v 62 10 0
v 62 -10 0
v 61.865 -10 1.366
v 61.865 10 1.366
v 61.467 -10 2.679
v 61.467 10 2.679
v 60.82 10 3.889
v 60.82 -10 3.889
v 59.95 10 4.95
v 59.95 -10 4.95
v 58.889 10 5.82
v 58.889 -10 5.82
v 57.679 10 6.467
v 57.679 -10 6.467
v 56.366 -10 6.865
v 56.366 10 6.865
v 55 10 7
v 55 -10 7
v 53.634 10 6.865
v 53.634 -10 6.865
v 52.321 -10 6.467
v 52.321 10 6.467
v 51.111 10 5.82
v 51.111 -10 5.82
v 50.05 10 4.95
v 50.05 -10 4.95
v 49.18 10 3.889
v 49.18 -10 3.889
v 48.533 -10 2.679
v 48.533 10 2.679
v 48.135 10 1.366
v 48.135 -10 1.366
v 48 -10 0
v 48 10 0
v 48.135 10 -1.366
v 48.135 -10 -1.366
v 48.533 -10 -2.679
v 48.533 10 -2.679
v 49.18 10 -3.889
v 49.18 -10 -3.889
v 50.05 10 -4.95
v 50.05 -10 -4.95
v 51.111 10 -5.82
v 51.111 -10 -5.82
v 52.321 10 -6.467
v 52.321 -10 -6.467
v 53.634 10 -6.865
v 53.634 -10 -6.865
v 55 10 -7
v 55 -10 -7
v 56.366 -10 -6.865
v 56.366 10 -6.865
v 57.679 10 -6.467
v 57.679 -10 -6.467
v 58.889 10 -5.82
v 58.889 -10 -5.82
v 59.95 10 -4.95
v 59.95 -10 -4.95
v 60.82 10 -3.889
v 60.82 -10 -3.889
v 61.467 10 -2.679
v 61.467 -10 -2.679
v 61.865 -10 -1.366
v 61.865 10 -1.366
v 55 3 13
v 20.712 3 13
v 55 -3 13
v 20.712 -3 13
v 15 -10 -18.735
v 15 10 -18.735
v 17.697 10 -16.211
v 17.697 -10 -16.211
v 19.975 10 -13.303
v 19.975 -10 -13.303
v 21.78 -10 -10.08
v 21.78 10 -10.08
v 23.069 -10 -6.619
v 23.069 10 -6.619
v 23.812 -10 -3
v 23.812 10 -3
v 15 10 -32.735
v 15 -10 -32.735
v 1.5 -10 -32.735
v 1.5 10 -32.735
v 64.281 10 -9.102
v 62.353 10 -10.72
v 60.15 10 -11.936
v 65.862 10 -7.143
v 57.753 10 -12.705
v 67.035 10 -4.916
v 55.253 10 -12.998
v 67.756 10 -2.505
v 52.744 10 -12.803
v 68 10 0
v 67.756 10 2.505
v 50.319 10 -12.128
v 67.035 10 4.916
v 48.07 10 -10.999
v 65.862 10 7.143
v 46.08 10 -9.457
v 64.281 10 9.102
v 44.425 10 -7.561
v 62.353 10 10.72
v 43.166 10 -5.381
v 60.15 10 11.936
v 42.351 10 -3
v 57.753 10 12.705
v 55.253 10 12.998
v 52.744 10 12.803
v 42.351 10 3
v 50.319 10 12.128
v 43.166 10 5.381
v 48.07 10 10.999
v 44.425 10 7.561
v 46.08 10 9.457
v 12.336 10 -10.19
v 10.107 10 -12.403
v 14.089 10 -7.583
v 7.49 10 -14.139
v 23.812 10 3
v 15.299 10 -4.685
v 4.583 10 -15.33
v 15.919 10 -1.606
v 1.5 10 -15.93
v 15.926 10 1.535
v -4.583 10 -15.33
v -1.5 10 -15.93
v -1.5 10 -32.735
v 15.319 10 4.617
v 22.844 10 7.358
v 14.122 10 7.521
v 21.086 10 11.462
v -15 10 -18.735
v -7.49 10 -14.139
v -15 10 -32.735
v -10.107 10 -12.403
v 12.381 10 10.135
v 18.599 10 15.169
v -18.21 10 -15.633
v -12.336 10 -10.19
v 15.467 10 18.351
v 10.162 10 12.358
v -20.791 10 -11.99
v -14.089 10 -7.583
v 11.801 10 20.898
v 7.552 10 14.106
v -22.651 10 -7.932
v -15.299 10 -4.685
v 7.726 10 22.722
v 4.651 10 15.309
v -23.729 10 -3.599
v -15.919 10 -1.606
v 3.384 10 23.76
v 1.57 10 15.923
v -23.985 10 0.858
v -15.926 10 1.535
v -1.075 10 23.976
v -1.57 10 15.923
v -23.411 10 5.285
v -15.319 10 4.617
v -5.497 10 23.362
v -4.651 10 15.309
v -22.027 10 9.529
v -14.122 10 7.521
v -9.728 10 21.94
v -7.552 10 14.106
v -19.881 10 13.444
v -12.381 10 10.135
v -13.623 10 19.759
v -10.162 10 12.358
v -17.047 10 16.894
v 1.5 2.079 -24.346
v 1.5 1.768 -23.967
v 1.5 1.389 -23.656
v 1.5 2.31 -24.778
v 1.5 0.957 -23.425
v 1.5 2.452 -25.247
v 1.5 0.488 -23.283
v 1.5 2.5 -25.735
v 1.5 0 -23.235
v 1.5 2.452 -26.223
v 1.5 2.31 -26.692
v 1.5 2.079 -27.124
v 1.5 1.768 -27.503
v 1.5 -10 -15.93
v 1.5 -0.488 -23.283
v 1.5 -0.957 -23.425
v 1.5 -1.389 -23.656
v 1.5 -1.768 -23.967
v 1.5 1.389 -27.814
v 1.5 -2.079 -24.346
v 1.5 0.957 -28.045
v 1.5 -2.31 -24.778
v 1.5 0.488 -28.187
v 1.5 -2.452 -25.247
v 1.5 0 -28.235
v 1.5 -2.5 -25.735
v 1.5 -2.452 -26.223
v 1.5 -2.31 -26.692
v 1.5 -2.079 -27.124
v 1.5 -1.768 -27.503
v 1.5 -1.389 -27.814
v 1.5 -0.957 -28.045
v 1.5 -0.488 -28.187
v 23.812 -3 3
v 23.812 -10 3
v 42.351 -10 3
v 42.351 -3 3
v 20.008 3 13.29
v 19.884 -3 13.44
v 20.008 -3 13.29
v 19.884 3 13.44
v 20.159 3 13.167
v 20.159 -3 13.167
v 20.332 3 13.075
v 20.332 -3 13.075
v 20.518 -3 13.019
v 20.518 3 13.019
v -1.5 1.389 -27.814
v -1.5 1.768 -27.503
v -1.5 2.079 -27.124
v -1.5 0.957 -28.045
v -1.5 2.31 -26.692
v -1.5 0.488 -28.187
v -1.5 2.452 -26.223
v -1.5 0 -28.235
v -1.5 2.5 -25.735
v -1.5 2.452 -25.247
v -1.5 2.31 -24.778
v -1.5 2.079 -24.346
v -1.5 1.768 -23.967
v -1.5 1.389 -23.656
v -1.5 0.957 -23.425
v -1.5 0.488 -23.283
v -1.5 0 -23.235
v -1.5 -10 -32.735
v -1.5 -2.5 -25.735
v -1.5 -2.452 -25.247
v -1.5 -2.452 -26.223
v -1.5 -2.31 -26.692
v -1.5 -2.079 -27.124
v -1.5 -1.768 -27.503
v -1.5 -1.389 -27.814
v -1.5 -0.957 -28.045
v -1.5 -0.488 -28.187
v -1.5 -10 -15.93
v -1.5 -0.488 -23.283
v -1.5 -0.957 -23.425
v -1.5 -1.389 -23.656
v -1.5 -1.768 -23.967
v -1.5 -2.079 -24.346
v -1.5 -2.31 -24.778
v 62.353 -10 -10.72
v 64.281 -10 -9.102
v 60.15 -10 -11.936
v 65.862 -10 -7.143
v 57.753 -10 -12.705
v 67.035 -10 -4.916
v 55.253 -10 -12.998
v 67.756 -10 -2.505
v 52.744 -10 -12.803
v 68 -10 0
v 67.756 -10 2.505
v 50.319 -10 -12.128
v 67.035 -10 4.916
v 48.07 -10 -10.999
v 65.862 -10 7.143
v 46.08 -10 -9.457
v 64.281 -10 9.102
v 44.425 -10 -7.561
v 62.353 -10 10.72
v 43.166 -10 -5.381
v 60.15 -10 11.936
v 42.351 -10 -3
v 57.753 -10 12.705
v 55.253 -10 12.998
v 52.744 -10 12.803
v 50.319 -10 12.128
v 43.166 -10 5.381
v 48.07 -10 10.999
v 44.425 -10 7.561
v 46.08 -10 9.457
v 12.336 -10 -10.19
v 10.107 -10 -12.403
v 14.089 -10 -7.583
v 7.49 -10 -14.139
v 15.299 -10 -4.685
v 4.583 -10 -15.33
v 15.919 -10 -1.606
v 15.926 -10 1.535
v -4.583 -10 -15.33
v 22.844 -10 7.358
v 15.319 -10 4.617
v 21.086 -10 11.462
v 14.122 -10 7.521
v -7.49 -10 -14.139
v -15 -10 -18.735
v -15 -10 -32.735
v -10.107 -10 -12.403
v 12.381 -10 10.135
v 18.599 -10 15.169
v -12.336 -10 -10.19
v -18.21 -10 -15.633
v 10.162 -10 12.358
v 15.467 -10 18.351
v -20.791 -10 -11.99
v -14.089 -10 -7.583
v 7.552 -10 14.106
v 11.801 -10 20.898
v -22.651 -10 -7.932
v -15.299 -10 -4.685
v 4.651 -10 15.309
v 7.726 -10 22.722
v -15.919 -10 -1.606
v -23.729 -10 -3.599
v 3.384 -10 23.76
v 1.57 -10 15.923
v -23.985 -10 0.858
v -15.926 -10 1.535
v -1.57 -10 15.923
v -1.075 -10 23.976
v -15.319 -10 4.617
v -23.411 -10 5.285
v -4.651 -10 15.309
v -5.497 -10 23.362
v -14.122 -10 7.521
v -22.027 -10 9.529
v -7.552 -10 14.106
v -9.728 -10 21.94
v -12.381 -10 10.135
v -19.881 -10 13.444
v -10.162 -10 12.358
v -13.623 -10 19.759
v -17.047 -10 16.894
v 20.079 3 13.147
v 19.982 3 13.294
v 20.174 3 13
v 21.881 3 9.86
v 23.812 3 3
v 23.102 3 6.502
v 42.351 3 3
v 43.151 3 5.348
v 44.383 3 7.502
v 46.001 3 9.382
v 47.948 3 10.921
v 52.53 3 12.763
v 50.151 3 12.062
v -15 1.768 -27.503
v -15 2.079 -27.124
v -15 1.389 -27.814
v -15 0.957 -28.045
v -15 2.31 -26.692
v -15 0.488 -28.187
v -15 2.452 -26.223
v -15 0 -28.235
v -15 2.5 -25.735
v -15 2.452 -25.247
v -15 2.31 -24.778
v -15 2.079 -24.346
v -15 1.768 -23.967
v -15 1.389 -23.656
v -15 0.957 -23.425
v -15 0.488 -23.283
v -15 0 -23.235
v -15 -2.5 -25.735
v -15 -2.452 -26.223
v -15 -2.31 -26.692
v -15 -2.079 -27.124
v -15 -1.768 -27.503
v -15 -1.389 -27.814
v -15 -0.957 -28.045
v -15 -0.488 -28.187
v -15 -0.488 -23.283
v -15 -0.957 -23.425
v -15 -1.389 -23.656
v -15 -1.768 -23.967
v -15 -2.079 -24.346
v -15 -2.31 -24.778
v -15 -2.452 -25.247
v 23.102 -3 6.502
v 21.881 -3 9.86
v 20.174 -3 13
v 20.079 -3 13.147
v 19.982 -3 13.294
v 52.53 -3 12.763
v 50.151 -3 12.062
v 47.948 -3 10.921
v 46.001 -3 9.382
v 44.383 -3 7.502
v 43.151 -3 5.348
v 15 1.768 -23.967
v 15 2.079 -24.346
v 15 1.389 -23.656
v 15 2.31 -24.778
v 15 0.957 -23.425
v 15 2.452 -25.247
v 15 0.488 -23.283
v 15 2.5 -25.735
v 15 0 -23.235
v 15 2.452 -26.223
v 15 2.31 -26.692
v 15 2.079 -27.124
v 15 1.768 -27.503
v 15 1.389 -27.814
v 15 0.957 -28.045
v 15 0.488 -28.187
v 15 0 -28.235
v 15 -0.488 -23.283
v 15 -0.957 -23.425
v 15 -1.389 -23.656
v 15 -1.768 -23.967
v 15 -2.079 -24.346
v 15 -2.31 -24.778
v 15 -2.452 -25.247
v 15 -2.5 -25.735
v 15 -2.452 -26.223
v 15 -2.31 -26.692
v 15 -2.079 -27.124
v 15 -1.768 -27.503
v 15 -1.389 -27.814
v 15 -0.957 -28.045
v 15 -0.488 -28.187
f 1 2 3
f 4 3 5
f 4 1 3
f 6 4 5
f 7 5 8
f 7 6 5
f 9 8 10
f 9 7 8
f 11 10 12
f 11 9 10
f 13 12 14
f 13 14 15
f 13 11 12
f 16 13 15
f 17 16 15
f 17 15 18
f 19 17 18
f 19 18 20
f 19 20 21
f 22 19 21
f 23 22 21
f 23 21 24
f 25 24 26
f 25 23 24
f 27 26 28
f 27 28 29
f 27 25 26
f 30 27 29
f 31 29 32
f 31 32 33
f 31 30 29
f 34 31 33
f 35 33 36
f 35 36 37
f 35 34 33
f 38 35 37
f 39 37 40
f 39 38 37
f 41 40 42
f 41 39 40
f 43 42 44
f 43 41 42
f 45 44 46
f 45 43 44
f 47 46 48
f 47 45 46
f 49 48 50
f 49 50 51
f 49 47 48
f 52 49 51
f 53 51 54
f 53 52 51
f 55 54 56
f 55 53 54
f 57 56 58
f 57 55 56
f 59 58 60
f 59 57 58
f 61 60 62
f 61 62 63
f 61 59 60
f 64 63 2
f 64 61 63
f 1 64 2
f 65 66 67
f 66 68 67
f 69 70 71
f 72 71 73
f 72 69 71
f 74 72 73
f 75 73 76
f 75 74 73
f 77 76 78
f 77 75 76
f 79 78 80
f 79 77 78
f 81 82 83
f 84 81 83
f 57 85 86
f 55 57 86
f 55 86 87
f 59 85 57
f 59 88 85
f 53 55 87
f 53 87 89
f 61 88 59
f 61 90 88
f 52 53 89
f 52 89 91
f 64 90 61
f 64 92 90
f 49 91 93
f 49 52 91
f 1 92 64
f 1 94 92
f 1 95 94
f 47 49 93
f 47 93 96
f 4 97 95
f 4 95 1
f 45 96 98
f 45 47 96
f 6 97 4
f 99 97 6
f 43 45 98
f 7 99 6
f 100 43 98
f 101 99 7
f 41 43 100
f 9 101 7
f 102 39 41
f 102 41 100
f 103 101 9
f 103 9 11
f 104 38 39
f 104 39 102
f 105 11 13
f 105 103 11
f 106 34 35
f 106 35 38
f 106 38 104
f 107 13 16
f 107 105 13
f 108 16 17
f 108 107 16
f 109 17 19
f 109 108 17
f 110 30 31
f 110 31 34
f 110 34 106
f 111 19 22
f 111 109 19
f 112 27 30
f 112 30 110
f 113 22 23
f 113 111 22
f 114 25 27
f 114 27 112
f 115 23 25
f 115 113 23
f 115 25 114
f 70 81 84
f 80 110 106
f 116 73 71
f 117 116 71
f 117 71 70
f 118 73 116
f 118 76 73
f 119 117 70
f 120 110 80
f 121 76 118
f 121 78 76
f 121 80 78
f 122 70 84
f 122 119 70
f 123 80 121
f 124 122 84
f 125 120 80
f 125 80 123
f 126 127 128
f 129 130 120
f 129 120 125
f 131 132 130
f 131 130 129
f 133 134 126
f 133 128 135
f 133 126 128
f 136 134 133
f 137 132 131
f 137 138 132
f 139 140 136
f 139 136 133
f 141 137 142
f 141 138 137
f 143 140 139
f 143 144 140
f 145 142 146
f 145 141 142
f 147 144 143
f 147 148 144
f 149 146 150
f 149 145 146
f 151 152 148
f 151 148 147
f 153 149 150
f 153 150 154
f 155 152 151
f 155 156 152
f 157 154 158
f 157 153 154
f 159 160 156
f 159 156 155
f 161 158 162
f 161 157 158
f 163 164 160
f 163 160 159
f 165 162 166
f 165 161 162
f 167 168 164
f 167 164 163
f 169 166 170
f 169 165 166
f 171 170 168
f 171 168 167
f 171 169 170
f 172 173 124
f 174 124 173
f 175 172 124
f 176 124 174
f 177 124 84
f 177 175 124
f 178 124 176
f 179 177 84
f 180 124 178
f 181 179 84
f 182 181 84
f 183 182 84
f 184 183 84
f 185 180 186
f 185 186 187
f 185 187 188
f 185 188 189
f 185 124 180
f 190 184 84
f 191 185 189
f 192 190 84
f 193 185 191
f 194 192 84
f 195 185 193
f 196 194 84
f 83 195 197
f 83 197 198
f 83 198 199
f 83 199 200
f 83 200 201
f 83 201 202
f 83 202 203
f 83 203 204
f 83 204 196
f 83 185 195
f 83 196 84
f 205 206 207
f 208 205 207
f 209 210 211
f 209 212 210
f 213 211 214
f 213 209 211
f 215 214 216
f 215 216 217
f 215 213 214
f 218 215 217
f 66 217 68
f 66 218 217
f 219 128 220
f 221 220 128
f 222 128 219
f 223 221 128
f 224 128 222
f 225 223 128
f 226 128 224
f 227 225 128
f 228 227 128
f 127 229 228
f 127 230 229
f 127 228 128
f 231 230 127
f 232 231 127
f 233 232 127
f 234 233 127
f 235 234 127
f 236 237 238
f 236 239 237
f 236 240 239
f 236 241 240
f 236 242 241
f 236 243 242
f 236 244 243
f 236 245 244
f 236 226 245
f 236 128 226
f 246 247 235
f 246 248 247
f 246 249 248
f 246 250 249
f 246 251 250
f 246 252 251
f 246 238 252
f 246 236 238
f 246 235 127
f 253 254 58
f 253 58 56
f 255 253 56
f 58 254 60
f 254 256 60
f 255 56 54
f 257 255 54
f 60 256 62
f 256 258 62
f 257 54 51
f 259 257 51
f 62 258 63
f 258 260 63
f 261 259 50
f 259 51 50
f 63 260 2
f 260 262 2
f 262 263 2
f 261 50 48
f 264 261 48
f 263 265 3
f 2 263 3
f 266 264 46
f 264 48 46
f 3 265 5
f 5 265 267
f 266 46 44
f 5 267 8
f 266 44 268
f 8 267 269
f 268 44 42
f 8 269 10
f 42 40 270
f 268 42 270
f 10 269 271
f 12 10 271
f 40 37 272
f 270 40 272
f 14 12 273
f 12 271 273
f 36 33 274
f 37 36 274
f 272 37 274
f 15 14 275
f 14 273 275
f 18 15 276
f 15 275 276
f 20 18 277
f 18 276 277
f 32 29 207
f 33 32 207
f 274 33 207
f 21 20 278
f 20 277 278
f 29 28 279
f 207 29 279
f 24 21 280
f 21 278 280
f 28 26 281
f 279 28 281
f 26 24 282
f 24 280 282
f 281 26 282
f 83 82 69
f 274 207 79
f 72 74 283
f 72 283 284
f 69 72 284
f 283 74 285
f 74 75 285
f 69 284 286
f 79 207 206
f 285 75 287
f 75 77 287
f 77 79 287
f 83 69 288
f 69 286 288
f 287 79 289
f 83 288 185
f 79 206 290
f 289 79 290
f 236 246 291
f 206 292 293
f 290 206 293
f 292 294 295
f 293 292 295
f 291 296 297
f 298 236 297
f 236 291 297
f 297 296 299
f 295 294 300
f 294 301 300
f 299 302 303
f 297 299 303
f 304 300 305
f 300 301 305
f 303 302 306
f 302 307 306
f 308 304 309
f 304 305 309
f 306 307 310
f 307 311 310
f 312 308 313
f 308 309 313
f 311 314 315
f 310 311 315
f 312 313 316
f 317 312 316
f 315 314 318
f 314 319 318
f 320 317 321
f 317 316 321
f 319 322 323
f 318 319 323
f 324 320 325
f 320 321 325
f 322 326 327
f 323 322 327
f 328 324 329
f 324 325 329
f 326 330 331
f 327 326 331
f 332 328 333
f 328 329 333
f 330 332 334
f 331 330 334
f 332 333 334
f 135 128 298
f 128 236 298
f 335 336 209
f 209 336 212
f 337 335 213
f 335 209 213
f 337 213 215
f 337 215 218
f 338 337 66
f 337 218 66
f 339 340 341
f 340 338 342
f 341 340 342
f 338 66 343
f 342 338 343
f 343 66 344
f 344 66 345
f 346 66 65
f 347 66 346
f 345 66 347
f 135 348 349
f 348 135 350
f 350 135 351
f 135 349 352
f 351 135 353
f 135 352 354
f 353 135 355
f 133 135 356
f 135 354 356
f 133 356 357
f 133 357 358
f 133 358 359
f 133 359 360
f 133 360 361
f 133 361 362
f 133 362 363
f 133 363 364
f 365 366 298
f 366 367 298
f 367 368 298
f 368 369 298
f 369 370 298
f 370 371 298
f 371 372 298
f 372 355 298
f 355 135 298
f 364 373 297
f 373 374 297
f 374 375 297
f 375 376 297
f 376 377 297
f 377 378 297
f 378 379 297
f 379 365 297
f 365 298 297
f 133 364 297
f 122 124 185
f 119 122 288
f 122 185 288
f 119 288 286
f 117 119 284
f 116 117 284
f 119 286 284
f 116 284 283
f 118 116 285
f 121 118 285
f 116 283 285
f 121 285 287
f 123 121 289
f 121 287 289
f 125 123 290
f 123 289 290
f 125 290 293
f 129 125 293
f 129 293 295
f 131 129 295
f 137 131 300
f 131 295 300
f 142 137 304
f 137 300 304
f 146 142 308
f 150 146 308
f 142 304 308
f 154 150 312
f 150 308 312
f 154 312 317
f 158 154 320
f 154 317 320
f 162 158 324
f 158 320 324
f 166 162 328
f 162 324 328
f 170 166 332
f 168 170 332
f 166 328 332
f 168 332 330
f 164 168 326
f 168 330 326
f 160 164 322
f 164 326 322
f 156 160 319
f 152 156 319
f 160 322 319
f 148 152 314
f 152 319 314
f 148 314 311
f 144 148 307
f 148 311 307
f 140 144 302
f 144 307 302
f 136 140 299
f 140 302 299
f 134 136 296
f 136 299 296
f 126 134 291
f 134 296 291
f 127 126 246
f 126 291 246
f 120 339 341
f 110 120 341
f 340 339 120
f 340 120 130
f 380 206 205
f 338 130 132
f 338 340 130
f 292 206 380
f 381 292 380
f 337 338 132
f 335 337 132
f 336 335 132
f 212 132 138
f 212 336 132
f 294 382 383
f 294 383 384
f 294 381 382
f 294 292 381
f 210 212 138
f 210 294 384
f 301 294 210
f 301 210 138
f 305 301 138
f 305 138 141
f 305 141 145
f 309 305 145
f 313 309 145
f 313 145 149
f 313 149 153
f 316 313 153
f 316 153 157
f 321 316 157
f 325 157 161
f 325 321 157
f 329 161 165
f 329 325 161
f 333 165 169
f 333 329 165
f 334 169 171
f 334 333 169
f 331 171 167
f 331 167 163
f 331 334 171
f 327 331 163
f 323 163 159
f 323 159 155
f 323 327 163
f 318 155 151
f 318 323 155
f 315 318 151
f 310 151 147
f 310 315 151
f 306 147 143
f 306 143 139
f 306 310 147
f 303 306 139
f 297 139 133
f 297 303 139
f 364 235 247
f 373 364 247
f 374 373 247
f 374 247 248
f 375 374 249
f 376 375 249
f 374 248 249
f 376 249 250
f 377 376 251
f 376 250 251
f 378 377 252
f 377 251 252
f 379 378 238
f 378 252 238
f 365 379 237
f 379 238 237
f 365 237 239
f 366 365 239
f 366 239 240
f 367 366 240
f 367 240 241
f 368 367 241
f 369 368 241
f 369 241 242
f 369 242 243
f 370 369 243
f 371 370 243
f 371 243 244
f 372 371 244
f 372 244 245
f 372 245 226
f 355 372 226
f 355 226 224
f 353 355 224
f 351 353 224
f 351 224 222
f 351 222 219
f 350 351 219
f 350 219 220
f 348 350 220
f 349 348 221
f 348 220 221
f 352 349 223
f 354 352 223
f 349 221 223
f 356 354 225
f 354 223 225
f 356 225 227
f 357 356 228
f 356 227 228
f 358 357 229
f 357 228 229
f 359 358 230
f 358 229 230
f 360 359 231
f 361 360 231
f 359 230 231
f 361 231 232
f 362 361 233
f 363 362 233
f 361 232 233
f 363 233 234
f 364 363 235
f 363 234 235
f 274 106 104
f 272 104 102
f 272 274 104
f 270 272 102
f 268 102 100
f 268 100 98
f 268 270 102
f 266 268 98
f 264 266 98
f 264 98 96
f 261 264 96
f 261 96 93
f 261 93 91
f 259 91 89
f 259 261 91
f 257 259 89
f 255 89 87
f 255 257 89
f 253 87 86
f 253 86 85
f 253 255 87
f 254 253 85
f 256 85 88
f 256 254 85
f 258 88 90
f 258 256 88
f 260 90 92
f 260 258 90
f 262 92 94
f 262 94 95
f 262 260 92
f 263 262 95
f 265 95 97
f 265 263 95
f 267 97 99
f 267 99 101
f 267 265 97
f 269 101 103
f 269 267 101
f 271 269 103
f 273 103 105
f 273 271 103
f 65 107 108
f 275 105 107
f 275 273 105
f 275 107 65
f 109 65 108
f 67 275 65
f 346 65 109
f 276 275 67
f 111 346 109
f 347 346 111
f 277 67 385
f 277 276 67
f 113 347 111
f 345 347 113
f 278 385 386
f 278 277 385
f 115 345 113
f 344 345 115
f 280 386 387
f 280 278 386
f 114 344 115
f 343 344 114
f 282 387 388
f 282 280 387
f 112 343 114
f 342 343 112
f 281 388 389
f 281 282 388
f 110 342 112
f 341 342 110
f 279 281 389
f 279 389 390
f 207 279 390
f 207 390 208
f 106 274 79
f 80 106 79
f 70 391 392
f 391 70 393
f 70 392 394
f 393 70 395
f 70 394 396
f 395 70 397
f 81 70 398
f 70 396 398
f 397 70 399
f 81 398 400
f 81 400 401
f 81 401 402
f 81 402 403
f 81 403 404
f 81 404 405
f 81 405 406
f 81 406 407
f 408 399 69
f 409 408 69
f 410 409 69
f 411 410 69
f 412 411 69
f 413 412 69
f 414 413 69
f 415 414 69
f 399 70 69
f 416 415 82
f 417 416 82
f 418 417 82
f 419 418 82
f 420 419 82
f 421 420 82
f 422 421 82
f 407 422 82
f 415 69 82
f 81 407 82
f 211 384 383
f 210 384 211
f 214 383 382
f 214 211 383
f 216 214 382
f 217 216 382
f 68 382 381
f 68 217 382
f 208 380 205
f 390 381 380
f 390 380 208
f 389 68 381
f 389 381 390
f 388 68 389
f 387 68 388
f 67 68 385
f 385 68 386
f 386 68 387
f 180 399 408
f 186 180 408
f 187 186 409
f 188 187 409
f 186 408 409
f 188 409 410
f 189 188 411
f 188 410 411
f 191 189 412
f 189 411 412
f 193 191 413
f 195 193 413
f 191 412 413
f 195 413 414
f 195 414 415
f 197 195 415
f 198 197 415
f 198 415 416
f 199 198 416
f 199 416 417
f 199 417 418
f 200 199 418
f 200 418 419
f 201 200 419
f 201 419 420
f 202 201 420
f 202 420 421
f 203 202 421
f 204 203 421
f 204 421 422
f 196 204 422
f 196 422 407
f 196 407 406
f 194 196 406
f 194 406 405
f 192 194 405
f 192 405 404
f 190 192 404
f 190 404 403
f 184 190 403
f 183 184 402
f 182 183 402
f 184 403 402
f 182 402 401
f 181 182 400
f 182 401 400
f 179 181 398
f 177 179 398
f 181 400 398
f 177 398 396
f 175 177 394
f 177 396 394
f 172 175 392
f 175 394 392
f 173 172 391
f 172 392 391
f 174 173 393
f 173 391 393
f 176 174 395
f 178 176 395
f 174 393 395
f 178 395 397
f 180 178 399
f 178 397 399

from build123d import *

# Parameters (mm, degrees)
SKETCH_R     = 7
PAD_DEPTH    = 10
SKETCH001_R  = 2.5
POCKET_DEPTH = 39.001
PAD001_DEPTH = 3
FILLET_R     = 1


with BuildPart() as pocket:
    # Sketch → Pad (new body, symmetric)
    with BuildSketch(Plane.XZ):
        with BuildLine():
            ThreePointArc((1.5, -15.929532), (0, 16), (-1.5, -15.929532))
            Line((-1.5, -32.734994), (-1.5, -15.929532))
            Line((-1.5, -32.734994), (-15, -32.734994))
            Line((-15, -32.734994), (-15, -18.734994))
            ThreePointArc((23.811762, 3), (-11.726648, 20.940051), (-15, -18.734994))
            Line((23.811762, 3), (42.350889, 3))
            ThreePointArc((42.350889, -3), (68, 0), (42.350889, 3))
            Line((42.350889, -3), (23.811762, -3))
            ThreePointArc((15, -18.734994), (20.940051, -11.726648), (23.811762, -3))
            Line((15, -18.734994), (15, -32.734994))
            Line((15, -32.734994), (1.5, -32.734994))
            Line((1.5, -15.929532), (1.5, -32.734994))
        make_face()
        with Locations((55, 0)):
            Circle(SKETCH_R, mode=Mode.SUBTRACT)
    extrude(amount=PAD_DEPTH, both=True)

    # Sketch001 → Pocket (cut, through all)
    with BuildSketch(Plane(origin=(15, 0, 0), x_dir=(0, 0, 1), z_dir=(1, 0, 0))):
        with Locations((-25.734994, 0)):
            Circle(SKETCH001_R)
    extrude(amount=-POCKET_DEPTH, mode=Mode.SUBTRACT)


with BuildPart() as fillet_body:
    # Sketch002 → Pad001 (new body, symmetric)
    with BuildSketch(Plane.XZ):
        with BuildLine():
            Line((23.811762, 3), (42.350889, 3))
            ThreePointArc((55, 13), (46.937742, 10.198039), (42.350889, 3))
            Line((20.174241, 13), (55, 13))
            ThreePointArc((23.811762, 3), (22.554204, 8.204139), (20.174241, 13))
        make_face()
    extrude(amount=PAD001_DEPTH, both=True)

    # Fusion: union Pocket
    add(pocket.part)

    # Fillet
    fillet_edges = [fillet_body.edges().sort_by_distance(p)[0] for p in [
        (20.174241, 0, 13),
    ]]
    fillet(fillet_edges, radius=FILLET_R)


solid = fillet_body.part
